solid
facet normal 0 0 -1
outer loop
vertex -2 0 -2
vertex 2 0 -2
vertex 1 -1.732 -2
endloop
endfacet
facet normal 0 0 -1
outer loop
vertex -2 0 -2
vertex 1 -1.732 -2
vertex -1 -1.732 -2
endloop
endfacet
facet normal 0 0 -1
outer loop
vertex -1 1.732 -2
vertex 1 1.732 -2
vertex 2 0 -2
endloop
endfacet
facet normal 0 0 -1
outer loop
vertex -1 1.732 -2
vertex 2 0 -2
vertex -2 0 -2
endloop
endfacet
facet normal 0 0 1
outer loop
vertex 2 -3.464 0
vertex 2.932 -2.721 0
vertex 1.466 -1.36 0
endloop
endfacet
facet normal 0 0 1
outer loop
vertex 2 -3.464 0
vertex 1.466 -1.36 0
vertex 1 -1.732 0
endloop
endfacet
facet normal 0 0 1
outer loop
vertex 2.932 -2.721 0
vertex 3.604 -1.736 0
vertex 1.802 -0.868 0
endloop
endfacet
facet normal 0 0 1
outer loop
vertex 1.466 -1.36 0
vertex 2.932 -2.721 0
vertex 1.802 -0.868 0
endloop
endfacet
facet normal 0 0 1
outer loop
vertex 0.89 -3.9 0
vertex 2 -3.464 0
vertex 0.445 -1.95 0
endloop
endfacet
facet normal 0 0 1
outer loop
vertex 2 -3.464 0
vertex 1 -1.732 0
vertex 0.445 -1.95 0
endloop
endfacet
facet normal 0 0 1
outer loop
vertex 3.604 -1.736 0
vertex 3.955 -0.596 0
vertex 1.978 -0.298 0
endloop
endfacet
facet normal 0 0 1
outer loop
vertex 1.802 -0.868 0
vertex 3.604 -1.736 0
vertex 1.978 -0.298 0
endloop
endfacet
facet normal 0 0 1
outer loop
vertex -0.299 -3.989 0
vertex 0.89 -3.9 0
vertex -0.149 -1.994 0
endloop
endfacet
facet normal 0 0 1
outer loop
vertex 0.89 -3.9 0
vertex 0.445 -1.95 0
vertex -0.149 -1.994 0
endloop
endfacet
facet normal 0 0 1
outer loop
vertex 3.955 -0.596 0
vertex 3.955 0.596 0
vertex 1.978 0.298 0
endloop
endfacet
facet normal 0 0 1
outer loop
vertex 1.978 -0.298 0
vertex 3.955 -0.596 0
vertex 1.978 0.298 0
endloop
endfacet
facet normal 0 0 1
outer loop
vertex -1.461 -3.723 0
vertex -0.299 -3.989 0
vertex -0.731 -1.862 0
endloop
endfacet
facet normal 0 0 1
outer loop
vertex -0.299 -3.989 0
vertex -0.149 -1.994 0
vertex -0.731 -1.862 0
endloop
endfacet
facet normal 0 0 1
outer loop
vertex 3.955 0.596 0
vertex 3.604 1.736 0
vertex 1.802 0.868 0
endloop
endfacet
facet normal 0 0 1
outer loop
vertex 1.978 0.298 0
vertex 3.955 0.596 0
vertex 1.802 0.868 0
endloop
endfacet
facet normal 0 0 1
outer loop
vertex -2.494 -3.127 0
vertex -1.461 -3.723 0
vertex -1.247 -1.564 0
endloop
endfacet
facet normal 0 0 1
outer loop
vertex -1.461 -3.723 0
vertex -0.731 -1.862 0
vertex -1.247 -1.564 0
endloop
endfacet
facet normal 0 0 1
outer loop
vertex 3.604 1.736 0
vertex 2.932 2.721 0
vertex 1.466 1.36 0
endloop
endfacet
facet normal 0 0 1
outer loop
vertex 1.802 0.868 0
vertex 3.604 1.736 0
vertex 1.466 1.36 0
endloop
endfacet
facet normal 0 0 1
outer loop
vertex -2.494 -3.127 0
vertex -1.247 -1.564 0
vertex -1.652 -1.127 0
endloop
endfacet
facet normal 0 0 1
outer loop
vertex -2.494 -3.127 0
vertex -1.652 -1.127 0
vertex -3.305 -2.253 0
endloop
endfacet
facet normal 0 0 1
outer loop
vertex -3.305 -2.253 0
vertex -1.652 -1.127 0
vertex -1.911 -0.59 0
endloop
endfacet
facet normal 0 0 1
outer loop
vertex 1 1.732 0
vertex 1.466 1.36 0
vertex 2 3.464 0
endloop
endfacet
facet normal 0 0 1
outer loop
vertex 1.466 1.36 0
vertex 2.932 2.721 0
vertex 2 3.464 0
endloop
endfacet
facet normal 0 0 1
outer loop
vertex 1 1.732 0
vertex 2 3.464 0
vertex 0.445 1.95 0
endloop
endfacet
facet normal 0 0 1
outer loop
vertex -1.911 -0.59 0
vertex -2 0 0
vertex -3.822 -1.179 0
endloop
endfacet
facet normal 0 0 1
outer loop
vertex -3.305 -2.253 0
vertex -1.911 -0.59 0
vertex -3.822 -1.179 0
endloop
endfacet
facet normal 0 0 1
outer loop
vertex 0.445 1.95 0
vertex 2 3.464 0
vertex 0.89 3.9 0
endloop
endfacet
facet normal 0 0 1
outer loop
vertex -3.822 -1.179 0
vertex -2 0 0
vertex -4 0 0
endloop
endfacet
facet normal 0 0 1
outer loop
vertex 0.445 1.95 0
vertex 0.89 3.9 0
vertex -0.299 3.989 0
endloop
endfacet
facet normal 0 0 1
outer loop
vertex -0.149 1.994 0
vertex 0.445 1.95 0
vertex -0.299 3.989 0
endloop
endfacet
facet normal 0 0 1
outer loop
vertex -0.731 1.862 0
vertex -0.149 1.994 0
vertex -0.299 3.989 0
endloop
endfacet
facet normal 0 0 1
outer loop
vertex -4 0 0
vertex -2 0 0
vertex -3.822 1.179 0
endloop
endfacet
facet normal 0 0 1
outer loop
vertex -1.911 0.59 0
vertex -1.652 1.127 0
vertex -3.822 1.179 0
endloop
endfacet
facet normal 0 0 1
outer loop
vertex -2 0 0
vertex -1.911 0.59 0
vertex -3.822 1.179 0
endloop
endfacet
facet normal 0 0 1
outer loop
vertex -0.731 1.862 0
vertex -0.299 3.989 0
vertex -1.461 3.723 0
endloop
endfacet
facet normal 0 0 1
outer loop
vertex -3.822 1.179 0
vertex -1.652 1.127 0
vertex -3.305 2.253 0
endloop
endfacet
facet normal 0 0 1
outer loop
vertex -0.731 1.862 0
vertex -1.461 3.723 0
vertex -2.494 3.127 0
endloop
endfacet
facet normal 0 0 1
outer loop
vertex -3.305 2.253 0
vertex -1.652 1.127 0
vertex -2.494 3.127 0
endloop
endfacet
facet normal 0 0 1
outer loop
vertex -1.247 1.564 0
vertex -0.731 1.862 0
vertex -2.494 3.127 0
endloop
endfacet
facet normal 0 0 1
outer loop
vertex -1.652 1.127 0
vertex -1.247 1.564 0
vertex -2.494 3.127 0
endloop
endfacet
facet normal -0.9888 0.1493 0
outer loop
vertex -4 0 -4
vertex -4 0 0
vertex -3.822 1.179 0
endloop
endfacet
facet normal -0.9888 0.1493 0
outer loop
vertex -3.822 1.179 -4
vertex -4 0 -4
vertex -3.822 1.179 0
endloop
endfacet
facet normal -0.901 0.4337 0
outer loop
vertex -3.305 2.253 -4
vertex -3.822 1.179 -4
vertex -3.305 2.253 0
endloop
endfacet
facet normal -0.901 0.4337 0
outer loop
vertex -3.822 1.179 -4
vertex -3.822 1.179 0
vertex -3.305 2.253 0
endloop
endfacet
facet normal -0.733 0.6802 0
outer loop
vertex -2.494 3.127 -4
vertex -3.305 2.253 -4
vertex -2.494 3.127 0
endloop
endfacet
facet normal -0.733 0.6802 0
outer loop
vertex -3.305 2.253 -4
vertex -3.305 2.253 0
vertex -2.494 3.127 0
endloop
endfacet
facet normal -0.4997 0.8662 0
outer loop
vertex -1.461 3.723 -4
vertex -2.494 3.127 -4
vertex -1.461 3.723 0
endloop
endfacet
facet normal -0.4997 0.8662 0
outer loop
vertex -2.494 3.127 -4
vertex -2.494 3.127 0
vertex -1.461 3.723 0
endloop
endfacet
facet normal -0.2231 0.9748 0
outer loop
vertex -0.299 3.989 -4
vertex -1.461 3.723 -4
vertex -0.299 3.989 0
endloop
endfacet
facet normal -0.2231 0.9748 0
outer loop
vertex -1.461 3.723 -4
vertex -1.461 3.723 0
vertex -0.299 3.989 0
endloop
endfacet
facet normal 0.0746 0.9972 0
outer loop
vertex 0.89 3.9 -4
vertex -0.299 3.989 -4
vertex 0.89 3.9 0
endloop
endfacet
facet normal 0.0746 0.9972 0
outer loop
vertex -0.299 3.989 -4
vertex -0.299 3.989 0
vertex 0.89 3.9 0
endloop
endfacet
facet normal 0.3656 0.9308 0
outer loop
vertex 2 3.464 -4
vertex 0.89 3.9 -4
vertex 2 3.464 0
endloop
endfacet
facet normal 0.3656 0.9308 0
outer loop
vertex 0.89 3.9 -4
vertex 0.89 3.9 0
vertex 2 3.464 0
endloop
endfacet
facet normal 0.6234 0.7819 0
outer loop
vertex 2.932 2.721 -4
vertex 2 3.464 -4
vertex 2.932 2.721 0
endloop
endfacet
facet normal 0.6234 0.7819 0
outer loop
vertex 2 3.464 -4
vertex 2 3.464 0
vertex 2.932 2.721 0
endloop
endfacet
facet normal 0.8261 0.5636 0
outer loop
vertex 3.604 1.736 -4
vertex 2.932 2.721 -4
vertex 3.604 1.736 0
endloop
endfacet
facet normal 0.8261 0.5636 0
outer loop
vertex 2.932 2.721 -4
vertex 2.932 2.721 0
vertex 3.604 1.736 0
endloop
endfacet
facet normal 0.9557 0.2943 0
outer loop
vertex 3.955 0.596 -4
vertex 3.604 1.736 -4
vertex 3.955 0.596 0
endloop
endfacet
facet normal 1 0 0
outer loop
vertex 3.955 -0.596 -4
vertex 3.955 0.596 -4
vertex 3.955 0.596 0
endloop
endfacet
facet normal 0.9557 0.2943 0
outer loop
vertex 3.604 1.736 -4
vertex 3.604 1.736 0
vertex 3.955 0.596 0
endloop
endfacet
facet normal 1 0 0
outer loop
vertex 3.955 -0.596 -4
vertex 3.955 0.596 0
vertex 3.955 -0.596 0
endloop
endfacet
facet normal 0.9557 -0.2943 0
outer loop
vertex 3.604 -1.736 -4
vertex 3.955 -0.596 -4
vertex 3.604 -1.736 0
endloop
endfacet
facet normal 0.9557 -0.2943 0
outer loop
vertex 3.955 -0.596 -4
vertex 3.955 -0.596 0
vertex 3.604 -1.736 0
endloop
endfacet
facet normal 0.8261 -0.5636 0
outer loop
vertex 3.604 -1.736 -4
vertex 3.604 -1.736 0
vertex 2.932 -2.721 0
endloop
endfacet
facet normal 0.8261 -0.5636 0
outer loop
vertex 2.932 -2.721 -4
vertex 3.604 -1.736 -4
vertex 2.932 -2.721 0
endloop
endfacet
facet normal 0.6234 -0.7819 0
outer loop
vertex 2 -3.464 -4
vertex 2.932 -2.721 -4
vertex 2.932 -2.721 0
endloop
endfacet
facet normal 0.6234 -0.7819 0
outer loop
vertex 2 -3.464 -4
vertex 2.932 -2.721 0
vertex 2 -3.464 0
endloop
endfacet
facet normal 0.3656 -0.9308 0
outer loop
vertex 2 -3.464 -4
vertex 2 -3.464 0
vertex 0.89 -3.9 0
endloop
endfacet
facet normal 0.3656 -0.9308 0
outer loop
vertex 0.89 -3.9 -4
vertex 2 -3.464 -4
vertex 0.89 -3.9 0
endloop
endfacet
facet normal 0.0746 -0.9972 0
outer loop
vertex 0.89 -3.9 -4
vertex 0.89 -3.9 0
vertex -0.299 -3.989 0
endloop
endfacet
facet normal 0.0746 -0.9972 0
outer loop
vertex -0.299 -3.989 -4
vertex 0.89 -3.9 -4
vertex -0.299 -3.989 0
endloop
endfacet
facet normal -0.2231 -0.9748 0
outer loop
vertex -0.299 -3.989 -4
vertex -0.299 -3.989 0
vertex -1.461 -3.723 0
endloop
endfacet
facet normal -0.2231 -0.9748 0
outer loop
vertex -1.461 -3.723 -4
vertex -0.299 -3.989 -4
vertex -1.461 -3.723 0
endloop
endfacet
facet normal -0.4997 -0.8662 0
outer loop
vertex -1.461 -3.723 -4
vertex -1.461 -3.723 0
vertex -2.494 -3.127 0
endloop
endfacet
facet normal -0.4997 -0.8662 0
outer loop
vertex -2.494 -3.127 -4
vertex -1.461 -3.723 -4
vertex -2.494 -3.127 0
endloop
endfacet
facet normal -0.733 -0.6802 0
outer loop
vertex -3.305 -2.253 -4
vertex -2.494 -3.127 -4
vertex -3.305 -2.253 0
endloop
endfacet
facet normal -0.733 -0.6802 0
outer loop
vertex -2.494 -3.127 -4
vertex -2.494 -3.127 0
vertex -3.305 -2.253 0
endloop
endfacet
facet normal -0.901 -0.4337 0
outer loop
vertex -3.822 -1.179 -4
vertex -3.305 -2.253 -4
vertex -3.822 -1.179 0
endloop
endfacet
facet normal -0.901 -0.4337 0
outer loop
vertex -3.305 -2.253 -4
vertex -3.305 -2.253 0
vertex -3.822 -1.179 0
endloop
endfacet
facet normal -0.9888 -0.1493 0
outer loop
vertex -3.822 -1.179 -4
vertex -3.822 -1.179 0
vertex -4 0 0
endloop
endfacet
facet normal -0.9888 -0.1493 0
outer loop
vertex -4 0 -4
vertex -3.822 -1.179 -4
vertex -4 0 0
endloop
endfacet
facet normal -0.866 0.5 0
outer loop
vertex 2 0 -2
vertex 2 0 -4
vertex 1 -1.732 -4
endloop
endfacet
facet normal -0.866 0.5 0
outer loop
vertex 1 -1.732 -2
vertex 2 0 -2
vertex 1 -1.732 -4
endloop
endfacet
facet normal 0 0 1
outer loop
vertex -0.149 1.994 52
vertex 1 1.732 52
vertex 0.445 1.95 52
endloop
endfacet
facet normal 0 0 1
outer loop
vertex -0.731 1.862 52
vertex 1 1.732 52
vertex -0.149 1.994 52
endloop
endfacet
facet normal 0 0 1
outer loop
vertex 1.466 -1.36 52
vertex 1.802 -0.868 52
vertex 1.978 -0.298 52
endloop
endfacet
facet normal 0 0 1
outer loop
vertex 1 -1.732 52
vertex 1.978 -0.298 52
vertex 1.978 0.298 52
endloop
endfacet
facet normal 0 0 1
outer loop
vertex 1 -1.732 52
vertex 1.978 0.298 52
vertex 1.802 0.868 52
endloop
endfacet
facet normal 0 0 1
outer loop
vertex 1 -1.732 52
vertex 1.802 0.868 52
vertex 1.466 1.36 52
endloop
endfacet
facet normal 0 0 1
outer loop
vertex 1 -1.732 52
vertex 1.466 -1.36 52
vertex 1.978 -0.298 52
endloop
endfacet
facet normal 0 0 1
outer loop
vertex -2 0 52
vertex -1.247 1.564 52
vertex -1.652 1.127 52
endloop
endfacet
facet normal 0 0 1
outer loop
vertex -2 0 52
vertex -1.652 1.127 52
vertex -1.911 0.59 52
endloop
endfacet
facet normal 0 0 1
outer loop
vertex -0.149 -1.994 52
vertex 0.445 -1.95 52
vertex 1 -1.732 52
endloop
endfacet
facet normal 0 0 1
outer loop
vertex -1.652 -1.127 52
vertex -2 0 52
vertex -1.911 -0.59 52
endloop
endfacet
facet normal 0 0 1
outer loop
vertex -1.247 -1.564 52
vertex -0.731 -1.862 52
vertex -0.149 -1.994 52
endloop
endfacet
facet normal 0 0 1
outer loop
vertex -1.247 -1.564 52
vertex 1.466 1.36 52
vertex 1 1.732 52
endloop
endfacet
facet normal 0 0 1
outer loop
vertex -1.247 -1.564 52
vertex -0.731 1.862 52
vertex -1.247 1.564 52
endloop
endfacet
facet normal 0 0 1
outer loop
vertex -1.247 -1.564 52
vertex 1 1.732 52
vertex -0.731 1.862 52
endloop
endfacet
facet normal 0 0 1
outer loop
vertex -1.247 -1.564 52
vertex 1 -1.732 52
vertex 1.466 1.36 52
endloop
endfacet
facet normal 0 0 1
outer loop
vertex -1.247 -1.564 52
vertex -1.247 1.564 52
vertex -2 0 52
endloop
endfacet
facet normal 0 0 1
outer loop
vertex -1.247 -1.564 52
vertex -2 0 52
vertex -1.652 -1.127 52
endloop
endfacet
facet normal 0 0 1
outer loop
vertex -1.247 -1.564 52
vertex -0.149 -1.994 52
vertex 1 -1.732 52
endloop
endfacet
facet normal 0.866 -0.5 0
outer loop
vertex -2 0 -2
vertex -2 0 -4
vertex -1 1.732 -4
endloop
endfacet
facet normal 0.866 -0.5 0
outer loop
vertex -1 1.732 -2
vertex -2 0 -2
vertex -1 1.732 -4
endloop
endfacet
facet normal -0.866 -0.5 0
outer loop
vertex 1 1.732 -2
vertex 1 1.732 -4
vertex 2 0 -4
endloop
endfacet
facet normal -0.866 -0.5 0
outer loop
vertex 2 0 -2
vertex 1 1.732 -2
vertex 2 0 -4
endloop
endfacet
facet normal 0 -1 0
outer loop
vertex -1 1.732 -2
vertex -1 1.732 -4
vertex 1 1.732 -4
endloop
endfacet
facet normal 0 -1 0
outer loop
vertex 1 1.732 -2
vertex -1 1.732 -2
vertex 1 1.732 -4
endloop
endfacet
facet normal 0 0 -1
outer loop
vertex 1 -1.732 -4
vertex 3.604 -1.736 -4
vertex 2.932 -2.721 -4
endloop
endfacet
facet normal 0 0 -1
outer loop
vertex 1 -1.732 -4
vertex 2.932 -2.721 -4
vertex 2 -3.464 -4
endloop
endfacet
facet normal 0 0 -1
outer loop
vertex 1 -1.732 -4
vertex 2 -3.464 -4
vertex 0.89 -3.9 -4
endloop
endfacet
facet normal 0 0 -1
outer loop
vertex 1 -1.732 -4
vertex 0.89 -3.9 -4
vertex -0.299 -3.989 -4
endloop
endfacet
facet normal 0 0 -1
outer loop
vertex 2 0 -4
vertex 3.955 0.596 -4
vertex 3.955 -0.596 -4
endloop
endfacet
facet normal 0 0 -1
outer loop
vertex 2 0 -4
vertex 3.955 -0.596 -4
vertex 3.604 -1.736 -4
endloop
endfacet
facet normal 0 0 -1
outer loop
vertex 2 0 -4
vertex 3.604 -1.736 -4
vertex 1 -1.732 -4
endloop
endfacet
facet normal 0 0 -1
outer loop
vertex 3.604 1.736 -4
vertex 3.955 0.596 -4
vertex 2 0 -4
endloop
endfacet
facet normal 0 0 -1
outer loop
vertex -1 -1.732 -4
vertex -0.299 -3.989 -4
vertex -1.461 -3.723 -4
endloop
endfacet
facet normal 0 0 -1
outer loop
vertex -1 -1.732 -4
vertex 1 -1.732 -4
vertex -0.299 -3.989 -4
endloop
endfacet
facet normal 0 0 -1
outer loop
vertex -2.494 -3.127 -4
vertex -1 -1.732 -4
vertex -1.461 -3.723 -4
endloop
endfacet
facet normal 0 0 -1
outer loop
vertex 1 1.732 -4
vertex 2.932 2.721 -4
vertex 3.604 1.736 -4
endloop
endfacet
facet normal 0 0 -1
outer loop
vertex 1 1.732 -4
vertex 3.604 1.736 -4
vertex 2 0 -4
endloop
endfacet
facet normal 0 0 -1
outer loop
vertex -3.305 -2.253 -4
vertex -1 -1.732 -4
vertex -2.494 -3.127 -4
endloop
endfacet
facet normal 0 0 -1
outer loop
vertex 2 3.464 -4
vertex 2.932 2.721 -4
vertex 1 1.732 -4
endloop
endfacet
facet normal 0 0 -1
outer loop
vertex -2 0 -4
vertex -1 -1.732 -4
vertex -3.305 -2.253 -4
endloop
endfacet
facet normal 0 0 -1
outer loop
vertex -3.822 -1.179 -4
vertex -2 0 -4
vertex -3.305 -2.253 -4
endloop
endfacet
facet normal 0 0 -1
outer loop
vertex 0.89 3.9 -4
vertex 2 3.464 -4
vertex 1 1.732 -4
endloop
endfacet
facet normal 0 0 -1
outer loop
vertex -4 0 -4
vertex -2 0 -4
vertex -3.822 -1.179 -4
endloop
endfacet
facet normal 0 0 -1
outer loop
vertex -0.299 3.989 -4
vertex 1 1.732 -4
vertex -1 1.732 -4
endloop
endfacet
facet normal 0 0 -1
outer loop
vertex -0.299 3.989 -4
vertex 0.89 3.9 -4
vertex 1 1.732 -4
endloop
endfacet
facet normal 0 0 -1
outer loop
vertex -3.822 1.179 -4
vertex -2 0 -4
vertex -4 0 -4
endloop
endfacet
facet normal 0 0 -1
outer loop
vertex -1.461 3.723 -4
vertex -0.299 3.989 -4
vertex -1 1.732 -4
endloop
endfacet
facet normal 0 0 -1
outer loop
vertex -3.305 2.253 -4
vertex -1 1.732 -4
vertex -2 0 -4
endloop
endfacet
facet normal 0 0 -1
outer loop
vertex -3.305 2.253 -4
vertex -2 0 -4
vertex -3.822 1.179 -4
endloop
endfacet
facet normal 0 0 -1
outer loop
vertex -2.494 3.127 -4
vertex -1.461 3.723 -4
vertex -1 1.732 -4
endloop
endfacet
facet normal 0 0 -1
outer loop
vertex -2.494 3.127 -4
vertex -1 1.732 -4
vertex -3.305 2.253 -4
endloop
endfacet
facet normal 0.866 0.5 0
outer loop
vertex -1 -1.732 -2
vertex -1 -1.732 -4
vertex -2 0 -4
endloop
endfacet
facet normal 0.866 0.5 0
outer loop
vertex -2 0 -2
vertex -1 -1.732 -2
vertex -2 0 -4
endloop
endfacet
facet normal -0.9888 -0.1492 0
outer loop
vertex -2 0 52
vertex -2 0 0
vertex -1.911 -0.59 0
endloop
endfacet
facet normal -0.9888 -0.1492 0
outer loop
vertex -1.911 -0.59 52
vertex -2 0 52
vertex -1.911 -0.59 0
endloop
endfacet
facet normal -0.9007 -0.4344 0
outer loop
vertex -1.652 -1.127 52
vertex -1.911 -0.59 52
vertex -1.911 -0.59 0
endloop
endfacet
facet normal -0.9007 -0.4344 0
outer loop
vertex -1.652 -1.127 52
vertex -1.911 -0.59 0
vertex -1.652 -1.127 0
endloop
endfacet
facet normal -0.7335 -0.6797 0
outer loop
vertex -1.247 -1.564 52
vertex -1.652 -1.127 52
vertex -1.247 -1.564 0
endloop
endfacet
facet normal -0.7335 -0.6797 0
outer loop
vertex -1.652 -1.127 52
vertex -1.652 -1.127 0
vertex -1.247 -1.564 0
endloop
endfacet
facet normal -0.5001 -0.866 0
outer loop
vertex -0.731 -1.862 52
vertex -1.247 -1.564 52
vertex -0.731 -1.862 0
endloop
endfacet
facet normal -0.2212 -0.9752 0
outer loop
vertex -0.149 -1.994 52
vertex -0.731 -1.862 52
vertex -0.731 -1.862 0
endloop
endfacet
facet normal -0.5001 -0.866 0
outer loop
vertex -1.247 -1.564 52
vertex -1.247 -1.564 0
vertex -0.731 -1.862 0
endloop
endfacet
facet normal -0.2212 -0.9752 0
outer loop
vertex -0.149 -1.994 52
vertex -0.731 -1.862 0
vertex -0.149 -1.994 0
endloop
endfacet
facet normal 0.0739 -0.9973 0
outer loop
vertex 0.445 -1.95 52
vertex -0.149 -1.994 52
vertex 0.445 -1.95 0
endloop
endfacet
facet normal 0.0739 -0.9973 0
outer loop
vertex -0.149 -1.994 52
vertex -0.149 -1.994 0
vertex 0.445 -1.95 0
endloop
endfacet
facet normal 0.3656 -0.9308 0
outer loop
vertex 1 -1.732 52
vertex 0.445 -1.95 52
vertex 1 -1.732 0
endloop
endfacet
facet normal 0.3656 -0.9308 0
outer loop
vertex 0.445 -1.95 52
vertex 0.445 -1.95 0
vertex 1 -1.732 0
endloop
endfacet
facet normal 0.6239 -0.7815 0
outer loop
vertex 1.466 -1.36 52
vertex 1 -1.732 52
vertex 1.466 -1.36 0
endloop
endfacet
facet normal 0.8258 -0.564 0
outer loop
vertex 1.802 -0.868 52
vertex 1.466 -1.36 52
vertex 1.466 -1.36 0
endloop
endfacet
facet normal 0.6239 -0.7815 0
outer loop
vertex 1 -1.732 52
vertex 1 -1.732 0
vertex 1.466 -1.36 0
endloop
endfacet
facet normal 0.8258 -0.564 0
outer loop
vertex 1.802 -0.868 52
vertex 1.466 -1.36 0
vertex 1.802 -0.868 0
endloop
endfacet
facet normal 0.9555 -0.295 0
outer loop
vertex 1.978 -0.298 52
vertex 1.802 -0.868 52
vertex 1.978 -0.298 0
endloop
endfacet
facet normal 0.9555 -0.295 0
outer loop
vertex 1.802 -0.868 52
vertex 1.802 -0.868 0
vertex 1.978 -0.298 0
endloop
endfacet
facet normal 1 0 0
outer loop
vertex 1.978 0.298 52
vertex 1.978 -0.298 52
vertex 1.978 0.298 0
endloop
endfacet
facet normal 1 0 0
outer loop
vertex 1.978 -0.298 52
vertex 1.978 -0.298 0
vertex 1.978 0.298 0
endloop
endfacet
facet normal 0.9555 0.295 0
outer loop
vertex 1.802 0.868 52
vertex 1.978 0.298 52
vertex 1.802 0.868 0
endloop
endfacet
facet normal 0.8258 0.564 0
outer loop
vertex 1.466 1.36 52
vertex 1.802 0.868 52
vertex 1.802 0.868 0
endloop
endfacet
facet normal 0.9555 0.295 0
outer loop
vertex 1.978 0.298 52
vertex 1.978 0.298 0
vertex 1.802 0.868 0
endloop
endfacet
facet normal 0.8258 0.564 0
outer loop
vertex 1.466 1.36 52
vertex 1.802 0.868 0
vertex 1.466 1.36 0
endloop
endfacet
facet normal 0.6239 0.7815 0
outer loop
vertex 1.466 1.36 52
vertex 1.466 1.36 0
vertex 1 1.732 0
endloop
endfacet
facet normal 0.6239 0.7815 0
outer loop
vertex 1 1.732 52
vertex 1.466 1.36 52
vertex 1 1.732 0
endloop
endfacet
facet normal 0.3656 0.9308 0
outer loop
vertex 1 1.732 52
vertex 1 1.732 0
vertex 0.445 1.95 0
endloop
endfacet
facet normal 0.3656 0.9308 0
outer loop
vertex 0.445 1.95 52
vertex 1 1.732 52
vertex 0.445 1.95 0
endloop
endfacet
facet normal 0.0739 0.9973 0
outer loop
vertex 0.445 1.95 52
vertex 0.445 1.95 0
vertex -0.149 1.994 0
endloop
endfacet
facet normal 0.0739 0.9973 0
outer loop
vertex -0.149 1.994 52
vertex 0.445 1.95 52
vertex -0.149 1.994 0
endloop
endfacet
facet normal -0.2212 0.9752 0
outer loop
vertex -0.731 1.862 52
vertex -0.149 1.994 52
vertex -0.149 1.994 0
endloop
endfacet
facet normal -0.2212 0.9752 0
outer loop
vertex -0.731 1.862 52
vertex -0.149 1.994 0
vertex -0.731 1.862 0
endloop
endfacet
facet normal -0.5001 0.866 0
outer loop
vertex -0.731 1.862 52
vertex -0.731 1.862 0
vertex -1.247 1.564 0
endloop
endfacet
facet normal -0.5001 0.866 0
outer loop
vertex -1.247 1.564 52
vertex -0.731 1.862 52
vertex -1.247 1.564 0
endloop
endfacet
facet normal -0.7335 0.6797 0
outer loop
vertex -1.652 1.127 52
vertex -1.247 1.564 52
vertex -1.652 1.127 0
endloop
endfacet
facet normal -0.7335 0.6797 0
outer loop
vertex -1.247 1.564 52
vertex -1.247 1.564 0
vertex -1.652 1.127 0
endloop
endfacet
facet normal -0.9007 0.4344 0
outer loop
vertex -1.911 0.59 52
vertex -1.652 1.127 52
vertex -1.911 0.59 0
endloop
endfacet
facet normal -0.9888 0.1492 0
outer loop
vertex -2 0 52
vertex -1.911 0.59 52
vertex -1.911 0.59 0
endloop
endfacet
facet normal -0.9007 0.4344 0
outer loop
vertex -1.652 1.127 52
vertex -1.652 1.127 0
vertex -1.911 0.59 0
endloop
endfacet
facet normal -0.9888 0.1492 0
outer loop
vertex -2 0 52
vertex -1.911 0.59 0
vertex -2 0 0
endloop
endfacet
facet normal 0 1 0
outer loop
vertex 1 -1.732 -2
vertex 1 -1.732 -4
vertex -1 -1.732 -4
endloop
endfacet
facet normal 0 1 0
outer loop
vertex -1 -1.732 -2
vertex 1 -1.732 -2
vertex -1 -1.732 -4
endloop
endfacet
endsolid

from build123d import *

# Parameters (mm, degrees)
SKETCH_1_R          = 2
EXTRUDE_1_DEPTH     = 52
SKETCH_2_R          = 4
EXTRUDE_2_DEPTH     = 4
CUT_EXTRUDE_1_DEPTH = 2


with BuildPart() as part:
    # 草图1 → 凸台-拉伸1 (new body)
    with BuildSketch(Plane.XY):
        with Locations(Location((0, 0, 0), (0, 0, 180))):
            Circle(SKETCH_1_R)
    extrude(amount=EXTRUDE_1_DEPTH)

    # 草图2 → 凸台-拉伸2 (add)
    with BuildSketch(Plane(origin=(0, 0, 0), x_dir=(-1, 0, 0), z_dir=(0, 0, -1))):
        Circle(SKETCH_2_R)
    extrude(amount=EXTRUDE_2_DEPTH)

    # 草图3 → 切除-拉伸1 (cut)
    with BuildSketch(Plane(origin=(0, 0, -4), x_dir=(-1, 0, 0), z_dir=(0, 0, -1))):
        Polygon((2, 0), (1, 1.732050808), (-1, 1.732050808), (-2, 0), (-1, -1.732050808), (1, -1.732050808), align=None)
    extrude(amount=-CUT_EXTRUDE_1_DEPTH, mode=Mode.SUBTRACT)


solid = part.part
